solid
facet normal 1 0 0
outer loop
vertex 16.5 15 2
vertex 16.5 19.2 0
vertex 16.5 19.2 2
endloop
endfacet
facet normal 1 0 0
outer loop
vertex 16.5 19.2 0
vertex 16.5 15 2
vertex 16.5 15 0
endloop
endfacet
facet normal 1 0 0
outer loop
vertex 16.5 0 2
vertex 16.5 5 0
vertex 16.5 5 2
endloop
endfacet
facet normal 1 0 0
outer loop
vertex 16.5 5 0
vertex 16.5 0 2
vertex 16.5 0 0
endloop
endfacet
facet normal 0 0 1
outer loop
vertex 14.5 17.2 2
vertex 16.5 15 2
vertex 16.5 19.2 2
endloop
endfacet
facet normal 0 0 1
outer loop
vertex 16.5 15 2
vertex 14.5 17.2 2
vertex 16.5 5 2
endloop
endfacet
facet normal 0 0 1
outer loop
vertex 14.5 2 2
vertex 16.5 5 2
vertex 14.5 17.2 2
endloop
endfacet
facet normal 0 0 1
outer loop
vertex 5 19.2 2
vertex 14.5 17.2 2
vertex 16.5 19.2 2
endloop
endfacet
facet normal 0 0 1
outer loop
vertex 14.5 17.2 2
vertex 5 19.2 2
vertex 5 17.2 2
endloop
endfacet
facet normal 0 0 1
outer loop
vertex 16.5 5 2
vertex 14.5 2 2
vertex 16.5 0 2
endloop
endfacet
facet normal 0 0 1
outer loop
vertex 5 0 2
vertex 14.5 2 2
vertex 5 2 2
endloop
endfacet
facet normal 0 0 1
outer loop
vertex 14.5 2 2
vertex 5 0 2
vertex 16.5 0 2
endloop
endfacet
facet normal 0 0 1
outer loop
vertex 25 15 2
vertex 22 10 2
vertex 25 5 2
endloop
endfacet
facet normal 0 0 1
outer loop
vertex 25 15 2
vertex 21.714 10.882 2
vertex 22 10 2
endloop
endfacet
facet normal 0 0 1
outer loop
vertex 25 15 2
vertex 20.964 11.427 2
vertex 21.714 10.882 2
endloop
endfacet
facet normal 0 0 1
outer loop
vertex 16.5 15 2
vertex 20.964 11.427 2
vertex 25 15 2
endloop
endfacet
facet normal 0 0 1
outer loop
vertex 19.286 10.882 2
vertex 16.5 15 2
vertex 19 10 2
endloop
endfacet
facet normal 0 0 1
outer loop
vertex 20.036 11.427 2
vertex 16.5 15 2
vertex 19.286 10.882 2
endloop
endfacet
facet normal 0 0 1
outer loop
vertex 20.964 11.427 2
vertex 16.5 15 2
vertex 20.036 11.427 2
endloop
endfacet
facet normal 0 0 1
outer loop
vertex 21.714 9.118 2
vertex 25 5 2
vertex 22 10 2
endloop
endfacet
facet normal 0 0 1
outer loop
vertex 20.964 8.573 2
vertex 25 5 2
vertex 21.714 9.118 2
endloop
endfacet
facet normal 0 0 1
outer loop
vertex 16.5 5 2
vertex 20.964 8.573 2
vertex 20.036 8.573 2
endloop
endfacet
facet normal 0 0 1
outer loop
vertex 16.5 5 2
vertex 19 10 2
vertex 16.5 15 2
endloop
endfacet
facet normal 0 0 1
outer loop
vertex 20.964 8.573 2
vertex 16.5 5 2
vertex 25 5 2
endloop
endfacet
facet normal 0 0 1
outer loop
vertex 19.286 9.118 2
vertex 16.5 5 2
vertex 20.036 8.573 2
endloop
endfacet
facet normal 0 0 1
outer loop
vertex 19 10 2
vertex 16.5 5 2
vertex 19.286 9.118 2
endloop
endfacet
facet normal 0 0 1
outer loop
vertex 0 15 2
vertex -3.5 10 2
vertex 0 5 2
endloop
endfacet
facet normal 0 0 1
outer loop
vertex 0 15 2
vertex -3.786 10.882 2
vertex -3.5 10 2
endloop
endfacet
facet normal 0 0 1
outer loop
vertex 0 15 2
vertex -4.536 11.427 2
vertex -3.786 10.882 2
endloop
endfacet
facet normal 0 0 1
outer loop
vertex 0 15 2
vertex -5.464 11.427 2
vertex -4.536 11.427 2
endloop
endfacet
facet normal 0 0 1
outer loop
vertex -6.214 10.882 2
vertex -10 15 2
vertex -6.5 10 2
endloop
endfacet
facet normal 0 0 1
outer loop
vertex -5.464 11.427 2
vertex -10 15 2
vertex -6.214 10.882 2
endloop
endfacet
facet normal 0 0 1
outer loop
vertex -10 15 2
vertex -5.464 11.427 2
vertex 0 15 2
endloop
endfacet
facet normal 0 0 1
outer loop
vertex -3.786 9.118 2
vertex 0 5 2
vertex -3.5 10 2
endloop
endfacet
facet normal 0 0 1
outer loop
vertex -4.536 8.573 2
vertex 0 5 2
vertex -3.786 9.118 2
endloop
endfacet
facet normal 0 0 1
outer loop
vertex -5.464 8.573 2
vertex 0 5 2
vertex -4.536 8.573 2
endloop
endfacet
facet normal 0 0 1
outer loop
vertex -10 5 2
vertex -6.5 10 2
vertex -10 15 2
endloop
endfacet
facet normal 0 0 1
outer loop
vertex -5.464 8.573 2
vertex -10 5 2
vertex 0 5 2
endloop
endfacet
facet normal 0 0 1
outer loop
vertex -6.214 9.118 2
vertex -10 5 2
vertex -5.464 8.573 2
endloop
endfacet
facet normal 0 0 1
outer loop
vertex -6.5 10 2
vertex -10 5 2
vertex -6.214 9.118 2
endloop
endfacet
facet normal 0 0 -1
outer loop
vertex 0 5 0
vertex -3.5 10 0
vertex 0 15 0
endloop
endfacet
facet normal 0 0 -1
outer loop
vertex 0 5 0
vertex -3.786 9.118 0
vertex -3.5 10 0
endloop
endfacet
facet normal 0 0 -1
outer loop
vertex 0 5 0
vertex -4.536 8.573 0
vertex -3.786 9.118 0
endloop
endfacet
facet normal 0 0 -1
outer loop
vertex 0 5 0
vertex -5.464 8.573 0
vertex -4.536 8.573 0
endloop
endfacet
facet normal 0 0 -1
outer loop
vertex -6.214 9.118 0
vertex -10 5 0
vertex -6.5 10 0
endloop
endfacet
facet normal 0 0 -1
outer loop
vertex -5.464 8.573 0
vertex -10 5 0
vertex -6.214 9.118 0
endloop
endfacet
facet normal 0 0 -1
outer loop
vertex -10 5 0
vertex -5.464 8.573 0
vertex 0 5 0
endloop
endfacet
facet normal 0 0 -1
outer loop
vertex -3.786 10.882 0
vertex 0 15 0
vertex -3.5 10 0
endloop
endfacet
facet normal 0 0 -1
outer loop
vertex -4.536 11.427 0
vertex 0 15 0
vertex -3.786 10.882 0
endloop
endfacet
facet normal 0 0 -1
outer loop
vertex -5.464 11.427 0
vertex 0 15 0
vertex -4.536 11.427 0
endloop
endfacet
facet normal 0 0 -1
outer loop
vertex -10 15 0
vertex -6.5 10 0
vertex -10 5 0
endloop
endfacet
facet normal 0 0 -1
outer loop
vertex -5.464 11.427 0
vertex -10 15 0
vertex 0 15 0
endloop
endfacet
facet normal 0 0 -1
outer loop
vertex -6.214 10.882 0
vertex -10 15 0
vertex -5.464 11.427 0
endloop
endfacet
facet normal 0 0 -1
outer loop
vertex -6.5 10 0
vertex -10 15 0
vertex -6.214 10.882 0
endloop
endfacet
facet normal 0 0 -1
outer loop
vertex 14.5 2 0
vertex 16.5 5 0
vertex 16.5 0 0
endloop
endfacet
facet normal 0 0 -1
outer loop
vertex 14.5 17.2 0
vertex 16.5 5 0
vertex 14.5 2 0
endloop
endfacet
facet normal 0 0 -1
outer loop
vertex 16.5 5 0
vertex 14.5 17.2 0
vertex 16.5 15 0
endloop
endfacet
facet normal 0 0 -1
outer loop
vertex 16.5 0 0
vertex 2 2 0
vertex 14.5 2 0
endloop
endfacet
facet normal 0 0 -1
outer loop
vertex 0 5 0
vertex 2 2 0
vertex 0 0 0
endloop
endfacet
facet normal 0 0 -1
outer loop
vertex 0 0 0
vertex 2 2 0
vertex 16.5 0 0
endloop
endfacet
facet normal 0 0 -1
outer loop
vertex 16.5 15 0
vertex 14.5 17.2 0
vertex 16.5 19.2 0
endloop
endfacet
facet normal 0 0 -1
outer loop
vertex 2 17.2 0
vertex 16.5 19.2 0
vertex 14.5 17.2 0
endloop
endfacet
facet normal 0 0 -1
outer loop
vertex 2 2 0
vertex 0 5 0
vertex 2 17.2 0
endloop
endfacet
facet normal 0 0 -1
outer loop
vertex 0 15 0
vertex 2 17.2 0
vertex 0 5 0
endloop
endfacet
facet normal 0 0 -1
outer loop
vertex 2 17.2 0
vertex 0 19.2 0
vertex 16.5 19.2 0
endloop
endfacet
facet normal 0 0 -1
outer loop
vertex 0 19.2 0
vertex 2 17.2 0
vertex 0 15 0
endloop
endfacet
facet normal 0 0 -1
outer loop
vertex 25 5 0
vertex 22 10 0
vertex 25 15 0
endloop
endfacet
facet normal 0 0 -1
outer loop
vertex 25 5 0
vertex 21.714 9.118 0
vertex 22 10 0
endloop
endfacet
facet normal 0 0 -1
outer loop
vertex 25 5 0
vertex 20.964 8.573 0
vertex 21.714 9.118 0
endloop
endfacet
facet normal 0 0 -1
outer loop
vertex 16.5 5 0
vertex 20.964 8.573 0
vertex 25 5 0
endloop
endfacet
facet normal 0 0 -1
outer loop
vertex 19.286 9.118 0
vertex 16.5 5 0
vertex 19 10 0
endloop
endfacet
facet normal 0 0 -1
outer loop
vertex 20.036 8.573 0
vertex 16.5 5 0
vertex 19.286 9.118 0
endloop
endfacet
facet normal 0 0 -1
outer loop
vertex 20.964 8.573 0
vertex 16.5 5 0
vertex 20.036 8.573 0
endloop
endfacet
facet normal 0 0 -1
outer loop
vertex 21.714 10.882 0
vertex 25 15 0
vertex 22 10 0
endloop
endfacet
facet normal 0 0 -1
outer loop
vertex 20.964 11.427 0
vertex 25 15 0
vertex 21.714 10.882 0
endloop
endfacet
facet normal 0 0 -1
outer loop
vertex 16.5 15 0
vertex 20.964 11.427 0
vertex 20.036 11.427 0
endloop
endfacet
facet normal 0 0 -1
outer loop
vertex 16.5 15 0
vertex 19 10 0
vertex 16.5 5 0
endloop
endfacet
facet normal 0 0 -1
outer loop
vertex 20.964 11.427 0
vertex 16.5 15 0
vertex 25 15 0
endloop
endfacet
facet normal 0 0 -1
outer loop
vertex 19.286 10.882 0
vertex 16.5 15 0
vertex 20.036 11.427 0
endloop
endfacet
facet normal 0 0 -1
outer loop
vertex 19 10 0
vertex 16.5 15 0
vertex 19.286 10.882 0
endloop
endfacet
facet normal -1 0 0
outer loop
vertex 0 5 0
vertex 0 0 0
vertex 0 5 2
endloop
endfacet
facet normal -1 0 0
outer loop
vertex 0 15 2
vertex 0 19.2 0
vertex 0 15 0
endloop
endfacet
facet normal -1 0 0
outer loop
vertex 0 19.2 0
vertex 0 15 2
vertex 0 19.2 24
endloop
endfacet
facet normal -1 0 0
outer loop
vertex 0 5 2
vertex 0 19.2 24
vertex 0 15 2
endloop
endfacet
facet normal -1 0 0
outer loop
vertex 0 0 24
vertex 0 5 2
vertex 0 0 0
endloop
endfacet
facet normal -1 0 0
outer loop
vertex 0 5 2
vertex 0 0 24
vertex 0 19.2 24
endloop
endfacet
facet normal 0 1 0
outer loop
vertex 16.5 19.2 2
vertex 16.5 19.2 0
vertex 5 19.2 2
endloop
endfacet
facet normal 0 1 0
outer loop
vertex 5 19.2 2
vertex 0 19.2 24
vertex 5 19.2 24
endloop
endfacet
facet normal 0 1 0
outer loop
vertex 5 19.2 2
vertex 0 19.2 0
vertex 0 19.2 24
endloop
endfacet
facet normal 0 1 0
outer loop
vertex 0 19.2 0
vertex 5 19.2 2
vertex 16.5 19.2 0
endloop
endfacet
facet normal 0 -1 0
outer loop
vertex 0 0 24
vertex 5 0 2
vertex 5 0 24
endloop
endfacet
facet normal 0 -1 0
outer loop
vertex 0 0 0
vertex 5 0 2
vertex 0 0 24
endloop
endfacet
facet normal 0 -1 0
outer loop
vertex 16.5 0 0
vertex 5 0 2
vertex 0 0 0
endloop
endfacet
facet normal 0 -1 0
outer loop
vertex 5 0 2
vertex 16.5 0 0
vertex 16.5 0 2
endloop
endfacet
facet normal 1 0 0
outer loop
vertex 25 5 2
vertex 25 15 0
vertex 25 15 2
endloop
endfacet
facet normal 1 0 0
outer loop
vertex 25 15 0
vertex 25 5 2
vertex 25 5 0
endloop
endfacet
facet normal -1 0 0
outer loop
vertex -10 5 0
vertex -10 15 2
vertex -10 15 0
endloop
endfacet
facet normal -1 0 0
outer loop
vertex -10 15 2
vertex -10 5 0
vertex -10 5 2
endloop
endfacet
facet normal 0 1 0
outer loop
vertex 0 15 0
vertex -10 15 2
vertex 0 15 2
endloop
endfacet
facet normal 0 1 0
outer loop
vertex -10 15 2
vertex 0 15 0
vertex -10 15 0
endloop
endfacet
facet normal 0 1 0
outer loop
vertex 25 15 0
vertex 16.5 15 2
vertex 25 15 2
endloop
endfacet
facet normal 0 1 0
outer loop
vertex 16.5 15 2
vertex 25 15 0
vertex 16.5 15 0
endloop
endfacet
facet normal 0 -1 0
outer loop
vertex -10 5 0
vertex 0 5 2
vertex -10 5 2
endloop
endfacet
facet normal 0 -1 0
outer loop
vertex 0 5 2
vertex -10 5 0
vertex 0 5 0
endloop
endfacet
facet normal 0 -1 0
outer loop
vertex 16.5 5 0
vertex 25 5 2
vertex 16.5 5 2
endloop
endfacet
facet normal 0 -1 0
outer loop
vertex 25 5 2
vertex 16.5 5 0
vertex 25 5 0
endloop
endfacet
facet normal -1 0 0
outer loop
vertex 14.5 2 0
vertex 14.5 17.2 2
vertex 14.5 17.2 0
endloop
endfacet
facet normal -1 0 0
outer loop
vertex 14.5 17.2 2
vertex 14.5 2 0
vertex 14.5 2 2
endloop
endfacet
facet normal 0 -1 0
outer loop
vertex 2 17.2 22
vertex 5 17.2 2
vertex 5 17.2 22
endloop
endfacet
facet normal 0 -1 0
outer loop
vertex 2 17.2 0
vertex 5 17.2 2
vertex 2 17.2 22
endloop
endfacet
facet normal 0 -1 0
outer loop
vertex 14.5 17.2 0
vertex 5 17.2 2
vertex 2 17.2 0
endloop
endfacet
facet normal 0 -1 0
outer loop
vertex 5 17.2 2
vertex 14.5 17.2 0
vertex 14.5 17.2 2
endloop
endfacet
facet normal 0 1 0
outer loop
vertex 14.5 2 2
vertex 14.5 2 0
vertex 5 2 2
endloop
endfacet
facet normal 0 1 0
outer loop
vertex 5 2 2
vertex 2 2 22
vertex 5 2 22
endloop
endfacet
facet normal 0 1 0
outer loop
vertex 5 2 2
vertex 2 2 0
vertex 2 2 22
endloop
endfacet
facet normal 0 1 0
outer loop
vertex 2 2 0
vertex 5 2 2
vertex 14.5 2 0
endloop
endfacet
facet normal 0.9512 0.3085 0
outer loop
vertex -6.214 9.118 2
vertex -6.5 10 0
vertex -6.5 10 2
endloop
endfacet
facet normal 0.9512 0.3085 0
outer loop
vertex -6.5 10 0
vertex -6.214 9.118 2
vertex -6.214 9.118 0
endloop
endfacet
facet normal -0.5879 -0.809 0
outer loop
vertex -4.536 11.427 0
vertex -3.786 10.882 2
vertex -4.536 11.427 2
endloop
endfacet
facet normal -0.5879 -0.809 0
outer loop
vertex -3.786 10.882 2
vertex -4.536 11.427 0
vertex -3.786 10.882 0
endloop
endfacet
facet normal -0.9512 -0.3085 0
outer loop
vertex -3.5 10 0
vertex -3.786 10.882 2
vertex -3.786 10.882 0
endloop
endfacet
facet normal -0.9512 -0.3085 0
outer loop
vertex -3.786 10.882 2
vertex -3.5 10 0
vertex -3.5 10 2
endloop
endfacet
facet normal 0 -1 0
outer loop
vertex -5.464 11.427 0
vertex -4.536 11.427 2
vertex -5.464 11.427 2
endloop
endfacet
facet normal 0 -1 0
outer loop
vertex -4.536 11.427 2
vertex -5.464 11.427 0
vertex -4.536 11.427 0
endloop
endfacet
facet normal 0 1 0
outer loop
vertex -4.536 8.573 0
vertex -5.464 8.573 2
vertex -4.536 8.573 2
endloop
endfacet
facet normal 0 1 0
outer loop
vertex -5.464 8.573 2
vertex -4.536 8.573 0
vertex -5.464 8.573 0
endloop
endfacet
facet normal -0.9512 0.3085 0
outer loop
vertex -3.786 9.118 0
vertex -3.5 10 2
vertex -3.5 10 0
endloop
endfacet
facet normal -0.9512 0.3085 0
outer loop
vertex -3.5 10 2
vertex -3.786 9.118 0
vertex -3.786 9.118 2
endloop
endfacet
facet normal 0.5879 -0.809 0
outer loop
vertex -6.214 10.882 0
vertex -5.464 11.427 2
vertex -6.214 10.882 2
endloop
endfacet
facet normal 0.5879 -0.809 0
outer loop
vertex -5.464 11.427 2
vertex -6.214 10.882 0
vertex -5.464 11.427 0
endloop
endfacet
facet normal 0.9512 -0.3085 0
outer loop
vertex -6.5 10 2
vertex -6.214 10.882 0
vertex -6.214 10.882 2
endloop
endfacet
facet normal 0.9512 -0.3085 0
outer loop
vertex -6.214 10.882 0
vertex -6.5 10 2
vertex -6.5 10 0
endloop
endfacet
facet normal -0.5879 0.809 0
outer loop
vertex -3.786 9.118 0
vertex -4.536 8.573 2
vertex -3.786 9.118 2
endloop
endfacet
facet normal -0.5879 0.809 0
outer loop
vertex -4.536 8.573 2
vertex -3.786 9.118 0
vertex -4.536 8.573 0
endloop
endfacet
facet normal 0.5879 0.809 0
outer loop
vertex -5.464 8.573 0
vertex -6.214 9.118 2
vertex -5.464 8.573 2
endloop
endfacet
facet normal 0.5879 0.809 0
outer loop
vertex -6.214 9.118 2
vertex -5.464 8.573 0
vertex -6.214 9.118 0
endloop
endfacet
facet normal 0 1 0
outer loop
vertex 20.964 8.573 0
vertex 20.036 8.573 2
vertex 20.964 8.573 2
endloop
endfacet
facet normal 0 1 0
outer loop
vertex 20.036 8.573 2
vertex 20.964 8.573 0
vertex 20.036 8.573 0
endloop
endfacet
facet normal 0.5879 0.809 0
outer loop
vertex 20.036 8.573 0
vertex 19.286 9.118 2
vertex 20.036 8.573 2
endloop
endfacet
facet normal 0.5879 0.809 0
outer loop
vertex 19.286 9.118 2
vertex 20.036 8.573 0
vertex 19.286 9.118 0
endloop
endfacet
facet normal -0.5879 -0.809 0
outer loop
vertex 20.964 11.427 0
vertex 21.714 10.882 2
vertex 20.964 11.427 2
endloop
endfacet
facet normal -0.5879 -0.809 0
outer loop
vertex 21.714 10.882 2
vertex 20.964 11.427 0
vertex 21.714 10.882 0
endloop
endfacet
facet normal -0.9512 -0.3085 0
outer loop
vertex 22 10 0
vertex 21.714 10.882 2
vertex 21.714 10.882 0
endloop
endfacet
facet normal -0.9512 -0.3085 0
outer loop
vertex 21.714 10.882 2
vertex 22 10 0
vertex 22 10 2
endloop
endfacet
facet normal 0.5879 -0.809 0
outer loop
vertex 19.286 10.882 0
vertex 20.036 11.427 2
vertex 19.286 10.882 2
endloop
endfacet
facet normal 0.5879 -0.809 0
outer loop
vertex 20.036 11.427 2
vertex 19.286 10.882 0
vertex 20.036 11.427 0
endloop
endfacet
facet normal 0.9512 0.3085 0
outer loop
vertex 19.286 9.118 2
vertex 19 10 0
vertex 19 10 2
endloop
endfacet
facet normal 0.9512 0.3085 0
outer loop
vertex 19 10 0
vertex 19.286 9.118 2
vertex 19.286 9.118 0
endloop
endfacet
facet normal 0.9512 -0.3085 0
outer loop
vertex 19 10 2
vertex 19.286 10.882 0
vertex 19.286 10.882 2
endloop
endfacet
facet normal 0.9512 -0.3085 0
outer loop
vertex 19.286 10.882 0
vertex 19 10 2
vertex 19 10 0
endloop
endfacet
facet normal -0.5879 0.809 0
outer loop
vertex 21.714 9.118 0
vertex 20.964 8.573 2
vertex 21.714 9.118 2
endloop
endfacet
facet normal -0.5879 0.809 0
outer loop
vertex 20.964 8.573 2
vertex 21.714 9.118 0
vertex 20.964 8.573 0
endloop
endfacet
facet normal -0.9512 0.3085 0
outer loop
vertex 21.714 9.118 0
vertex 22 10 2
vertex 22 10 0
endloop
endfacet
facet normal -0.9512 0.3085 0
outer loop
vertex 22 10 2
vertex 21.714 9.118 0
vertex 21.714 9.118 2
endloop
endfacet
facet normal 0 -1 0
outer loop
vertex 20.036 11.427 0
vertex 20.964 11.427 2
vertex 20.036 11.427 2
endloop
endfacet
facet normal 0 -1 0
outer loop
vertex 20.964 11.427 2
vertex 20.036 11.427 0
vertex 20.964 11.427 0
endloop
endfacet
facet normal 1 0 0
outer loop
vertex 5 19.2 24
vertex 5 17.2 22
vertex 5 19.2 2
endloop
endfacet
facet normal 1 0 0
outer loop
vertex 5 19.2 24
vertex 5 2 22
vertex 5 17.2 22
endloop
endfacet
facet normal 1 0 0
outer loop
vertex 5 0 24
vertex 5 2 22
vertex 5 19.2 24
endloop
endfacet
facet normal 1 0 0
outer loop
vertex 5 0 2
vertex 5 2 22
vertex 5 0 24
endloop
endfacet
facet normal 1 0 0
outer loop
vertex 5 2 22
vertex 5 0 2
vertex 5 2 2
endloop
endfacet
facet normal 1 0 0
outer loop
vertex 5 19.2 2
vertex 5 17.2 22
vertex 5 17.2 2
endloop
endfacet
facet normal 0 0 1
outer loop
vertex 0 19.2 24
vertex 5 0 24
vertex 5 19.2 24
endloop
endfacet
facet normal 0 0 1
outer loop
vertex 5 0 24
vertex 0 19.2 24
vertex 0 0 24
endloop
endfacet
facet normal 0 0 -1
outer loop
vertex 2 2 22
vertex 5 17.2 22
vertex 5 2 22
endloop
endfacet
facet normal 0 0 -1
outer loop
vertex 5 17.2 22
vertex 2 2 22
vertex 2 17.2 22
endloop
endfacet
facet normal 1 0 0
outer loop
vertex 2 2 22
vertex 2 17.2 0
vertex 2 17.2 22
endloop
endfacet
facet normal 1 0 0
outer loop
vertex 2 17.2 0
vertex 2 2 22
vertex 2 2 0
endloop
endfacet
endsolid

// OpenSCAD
/*
 * DCP-5.5-2.1-OT
 *
 * 取付ボルトはM3
 */

module base(){
    difference(){
        union(){
            cube([16.5,19.2,2]);
            translate([-10,5,0]) cube([35,10,2]);
        }
        
        translate([2,2,0]) cube([12.5,15.2,2]);
        translate([-5,10,0]) cylinder(h=2,d=3,$fn=10);
        translate([20.5,10,0]) cylinder(h=2,d=3,$fn=10);
    }
}

difference(){
    union(){
        base();
        cube([5,19.2,24]);
    }
    
    translate([2,2,0]) cube([5,15.2,22]);
}
